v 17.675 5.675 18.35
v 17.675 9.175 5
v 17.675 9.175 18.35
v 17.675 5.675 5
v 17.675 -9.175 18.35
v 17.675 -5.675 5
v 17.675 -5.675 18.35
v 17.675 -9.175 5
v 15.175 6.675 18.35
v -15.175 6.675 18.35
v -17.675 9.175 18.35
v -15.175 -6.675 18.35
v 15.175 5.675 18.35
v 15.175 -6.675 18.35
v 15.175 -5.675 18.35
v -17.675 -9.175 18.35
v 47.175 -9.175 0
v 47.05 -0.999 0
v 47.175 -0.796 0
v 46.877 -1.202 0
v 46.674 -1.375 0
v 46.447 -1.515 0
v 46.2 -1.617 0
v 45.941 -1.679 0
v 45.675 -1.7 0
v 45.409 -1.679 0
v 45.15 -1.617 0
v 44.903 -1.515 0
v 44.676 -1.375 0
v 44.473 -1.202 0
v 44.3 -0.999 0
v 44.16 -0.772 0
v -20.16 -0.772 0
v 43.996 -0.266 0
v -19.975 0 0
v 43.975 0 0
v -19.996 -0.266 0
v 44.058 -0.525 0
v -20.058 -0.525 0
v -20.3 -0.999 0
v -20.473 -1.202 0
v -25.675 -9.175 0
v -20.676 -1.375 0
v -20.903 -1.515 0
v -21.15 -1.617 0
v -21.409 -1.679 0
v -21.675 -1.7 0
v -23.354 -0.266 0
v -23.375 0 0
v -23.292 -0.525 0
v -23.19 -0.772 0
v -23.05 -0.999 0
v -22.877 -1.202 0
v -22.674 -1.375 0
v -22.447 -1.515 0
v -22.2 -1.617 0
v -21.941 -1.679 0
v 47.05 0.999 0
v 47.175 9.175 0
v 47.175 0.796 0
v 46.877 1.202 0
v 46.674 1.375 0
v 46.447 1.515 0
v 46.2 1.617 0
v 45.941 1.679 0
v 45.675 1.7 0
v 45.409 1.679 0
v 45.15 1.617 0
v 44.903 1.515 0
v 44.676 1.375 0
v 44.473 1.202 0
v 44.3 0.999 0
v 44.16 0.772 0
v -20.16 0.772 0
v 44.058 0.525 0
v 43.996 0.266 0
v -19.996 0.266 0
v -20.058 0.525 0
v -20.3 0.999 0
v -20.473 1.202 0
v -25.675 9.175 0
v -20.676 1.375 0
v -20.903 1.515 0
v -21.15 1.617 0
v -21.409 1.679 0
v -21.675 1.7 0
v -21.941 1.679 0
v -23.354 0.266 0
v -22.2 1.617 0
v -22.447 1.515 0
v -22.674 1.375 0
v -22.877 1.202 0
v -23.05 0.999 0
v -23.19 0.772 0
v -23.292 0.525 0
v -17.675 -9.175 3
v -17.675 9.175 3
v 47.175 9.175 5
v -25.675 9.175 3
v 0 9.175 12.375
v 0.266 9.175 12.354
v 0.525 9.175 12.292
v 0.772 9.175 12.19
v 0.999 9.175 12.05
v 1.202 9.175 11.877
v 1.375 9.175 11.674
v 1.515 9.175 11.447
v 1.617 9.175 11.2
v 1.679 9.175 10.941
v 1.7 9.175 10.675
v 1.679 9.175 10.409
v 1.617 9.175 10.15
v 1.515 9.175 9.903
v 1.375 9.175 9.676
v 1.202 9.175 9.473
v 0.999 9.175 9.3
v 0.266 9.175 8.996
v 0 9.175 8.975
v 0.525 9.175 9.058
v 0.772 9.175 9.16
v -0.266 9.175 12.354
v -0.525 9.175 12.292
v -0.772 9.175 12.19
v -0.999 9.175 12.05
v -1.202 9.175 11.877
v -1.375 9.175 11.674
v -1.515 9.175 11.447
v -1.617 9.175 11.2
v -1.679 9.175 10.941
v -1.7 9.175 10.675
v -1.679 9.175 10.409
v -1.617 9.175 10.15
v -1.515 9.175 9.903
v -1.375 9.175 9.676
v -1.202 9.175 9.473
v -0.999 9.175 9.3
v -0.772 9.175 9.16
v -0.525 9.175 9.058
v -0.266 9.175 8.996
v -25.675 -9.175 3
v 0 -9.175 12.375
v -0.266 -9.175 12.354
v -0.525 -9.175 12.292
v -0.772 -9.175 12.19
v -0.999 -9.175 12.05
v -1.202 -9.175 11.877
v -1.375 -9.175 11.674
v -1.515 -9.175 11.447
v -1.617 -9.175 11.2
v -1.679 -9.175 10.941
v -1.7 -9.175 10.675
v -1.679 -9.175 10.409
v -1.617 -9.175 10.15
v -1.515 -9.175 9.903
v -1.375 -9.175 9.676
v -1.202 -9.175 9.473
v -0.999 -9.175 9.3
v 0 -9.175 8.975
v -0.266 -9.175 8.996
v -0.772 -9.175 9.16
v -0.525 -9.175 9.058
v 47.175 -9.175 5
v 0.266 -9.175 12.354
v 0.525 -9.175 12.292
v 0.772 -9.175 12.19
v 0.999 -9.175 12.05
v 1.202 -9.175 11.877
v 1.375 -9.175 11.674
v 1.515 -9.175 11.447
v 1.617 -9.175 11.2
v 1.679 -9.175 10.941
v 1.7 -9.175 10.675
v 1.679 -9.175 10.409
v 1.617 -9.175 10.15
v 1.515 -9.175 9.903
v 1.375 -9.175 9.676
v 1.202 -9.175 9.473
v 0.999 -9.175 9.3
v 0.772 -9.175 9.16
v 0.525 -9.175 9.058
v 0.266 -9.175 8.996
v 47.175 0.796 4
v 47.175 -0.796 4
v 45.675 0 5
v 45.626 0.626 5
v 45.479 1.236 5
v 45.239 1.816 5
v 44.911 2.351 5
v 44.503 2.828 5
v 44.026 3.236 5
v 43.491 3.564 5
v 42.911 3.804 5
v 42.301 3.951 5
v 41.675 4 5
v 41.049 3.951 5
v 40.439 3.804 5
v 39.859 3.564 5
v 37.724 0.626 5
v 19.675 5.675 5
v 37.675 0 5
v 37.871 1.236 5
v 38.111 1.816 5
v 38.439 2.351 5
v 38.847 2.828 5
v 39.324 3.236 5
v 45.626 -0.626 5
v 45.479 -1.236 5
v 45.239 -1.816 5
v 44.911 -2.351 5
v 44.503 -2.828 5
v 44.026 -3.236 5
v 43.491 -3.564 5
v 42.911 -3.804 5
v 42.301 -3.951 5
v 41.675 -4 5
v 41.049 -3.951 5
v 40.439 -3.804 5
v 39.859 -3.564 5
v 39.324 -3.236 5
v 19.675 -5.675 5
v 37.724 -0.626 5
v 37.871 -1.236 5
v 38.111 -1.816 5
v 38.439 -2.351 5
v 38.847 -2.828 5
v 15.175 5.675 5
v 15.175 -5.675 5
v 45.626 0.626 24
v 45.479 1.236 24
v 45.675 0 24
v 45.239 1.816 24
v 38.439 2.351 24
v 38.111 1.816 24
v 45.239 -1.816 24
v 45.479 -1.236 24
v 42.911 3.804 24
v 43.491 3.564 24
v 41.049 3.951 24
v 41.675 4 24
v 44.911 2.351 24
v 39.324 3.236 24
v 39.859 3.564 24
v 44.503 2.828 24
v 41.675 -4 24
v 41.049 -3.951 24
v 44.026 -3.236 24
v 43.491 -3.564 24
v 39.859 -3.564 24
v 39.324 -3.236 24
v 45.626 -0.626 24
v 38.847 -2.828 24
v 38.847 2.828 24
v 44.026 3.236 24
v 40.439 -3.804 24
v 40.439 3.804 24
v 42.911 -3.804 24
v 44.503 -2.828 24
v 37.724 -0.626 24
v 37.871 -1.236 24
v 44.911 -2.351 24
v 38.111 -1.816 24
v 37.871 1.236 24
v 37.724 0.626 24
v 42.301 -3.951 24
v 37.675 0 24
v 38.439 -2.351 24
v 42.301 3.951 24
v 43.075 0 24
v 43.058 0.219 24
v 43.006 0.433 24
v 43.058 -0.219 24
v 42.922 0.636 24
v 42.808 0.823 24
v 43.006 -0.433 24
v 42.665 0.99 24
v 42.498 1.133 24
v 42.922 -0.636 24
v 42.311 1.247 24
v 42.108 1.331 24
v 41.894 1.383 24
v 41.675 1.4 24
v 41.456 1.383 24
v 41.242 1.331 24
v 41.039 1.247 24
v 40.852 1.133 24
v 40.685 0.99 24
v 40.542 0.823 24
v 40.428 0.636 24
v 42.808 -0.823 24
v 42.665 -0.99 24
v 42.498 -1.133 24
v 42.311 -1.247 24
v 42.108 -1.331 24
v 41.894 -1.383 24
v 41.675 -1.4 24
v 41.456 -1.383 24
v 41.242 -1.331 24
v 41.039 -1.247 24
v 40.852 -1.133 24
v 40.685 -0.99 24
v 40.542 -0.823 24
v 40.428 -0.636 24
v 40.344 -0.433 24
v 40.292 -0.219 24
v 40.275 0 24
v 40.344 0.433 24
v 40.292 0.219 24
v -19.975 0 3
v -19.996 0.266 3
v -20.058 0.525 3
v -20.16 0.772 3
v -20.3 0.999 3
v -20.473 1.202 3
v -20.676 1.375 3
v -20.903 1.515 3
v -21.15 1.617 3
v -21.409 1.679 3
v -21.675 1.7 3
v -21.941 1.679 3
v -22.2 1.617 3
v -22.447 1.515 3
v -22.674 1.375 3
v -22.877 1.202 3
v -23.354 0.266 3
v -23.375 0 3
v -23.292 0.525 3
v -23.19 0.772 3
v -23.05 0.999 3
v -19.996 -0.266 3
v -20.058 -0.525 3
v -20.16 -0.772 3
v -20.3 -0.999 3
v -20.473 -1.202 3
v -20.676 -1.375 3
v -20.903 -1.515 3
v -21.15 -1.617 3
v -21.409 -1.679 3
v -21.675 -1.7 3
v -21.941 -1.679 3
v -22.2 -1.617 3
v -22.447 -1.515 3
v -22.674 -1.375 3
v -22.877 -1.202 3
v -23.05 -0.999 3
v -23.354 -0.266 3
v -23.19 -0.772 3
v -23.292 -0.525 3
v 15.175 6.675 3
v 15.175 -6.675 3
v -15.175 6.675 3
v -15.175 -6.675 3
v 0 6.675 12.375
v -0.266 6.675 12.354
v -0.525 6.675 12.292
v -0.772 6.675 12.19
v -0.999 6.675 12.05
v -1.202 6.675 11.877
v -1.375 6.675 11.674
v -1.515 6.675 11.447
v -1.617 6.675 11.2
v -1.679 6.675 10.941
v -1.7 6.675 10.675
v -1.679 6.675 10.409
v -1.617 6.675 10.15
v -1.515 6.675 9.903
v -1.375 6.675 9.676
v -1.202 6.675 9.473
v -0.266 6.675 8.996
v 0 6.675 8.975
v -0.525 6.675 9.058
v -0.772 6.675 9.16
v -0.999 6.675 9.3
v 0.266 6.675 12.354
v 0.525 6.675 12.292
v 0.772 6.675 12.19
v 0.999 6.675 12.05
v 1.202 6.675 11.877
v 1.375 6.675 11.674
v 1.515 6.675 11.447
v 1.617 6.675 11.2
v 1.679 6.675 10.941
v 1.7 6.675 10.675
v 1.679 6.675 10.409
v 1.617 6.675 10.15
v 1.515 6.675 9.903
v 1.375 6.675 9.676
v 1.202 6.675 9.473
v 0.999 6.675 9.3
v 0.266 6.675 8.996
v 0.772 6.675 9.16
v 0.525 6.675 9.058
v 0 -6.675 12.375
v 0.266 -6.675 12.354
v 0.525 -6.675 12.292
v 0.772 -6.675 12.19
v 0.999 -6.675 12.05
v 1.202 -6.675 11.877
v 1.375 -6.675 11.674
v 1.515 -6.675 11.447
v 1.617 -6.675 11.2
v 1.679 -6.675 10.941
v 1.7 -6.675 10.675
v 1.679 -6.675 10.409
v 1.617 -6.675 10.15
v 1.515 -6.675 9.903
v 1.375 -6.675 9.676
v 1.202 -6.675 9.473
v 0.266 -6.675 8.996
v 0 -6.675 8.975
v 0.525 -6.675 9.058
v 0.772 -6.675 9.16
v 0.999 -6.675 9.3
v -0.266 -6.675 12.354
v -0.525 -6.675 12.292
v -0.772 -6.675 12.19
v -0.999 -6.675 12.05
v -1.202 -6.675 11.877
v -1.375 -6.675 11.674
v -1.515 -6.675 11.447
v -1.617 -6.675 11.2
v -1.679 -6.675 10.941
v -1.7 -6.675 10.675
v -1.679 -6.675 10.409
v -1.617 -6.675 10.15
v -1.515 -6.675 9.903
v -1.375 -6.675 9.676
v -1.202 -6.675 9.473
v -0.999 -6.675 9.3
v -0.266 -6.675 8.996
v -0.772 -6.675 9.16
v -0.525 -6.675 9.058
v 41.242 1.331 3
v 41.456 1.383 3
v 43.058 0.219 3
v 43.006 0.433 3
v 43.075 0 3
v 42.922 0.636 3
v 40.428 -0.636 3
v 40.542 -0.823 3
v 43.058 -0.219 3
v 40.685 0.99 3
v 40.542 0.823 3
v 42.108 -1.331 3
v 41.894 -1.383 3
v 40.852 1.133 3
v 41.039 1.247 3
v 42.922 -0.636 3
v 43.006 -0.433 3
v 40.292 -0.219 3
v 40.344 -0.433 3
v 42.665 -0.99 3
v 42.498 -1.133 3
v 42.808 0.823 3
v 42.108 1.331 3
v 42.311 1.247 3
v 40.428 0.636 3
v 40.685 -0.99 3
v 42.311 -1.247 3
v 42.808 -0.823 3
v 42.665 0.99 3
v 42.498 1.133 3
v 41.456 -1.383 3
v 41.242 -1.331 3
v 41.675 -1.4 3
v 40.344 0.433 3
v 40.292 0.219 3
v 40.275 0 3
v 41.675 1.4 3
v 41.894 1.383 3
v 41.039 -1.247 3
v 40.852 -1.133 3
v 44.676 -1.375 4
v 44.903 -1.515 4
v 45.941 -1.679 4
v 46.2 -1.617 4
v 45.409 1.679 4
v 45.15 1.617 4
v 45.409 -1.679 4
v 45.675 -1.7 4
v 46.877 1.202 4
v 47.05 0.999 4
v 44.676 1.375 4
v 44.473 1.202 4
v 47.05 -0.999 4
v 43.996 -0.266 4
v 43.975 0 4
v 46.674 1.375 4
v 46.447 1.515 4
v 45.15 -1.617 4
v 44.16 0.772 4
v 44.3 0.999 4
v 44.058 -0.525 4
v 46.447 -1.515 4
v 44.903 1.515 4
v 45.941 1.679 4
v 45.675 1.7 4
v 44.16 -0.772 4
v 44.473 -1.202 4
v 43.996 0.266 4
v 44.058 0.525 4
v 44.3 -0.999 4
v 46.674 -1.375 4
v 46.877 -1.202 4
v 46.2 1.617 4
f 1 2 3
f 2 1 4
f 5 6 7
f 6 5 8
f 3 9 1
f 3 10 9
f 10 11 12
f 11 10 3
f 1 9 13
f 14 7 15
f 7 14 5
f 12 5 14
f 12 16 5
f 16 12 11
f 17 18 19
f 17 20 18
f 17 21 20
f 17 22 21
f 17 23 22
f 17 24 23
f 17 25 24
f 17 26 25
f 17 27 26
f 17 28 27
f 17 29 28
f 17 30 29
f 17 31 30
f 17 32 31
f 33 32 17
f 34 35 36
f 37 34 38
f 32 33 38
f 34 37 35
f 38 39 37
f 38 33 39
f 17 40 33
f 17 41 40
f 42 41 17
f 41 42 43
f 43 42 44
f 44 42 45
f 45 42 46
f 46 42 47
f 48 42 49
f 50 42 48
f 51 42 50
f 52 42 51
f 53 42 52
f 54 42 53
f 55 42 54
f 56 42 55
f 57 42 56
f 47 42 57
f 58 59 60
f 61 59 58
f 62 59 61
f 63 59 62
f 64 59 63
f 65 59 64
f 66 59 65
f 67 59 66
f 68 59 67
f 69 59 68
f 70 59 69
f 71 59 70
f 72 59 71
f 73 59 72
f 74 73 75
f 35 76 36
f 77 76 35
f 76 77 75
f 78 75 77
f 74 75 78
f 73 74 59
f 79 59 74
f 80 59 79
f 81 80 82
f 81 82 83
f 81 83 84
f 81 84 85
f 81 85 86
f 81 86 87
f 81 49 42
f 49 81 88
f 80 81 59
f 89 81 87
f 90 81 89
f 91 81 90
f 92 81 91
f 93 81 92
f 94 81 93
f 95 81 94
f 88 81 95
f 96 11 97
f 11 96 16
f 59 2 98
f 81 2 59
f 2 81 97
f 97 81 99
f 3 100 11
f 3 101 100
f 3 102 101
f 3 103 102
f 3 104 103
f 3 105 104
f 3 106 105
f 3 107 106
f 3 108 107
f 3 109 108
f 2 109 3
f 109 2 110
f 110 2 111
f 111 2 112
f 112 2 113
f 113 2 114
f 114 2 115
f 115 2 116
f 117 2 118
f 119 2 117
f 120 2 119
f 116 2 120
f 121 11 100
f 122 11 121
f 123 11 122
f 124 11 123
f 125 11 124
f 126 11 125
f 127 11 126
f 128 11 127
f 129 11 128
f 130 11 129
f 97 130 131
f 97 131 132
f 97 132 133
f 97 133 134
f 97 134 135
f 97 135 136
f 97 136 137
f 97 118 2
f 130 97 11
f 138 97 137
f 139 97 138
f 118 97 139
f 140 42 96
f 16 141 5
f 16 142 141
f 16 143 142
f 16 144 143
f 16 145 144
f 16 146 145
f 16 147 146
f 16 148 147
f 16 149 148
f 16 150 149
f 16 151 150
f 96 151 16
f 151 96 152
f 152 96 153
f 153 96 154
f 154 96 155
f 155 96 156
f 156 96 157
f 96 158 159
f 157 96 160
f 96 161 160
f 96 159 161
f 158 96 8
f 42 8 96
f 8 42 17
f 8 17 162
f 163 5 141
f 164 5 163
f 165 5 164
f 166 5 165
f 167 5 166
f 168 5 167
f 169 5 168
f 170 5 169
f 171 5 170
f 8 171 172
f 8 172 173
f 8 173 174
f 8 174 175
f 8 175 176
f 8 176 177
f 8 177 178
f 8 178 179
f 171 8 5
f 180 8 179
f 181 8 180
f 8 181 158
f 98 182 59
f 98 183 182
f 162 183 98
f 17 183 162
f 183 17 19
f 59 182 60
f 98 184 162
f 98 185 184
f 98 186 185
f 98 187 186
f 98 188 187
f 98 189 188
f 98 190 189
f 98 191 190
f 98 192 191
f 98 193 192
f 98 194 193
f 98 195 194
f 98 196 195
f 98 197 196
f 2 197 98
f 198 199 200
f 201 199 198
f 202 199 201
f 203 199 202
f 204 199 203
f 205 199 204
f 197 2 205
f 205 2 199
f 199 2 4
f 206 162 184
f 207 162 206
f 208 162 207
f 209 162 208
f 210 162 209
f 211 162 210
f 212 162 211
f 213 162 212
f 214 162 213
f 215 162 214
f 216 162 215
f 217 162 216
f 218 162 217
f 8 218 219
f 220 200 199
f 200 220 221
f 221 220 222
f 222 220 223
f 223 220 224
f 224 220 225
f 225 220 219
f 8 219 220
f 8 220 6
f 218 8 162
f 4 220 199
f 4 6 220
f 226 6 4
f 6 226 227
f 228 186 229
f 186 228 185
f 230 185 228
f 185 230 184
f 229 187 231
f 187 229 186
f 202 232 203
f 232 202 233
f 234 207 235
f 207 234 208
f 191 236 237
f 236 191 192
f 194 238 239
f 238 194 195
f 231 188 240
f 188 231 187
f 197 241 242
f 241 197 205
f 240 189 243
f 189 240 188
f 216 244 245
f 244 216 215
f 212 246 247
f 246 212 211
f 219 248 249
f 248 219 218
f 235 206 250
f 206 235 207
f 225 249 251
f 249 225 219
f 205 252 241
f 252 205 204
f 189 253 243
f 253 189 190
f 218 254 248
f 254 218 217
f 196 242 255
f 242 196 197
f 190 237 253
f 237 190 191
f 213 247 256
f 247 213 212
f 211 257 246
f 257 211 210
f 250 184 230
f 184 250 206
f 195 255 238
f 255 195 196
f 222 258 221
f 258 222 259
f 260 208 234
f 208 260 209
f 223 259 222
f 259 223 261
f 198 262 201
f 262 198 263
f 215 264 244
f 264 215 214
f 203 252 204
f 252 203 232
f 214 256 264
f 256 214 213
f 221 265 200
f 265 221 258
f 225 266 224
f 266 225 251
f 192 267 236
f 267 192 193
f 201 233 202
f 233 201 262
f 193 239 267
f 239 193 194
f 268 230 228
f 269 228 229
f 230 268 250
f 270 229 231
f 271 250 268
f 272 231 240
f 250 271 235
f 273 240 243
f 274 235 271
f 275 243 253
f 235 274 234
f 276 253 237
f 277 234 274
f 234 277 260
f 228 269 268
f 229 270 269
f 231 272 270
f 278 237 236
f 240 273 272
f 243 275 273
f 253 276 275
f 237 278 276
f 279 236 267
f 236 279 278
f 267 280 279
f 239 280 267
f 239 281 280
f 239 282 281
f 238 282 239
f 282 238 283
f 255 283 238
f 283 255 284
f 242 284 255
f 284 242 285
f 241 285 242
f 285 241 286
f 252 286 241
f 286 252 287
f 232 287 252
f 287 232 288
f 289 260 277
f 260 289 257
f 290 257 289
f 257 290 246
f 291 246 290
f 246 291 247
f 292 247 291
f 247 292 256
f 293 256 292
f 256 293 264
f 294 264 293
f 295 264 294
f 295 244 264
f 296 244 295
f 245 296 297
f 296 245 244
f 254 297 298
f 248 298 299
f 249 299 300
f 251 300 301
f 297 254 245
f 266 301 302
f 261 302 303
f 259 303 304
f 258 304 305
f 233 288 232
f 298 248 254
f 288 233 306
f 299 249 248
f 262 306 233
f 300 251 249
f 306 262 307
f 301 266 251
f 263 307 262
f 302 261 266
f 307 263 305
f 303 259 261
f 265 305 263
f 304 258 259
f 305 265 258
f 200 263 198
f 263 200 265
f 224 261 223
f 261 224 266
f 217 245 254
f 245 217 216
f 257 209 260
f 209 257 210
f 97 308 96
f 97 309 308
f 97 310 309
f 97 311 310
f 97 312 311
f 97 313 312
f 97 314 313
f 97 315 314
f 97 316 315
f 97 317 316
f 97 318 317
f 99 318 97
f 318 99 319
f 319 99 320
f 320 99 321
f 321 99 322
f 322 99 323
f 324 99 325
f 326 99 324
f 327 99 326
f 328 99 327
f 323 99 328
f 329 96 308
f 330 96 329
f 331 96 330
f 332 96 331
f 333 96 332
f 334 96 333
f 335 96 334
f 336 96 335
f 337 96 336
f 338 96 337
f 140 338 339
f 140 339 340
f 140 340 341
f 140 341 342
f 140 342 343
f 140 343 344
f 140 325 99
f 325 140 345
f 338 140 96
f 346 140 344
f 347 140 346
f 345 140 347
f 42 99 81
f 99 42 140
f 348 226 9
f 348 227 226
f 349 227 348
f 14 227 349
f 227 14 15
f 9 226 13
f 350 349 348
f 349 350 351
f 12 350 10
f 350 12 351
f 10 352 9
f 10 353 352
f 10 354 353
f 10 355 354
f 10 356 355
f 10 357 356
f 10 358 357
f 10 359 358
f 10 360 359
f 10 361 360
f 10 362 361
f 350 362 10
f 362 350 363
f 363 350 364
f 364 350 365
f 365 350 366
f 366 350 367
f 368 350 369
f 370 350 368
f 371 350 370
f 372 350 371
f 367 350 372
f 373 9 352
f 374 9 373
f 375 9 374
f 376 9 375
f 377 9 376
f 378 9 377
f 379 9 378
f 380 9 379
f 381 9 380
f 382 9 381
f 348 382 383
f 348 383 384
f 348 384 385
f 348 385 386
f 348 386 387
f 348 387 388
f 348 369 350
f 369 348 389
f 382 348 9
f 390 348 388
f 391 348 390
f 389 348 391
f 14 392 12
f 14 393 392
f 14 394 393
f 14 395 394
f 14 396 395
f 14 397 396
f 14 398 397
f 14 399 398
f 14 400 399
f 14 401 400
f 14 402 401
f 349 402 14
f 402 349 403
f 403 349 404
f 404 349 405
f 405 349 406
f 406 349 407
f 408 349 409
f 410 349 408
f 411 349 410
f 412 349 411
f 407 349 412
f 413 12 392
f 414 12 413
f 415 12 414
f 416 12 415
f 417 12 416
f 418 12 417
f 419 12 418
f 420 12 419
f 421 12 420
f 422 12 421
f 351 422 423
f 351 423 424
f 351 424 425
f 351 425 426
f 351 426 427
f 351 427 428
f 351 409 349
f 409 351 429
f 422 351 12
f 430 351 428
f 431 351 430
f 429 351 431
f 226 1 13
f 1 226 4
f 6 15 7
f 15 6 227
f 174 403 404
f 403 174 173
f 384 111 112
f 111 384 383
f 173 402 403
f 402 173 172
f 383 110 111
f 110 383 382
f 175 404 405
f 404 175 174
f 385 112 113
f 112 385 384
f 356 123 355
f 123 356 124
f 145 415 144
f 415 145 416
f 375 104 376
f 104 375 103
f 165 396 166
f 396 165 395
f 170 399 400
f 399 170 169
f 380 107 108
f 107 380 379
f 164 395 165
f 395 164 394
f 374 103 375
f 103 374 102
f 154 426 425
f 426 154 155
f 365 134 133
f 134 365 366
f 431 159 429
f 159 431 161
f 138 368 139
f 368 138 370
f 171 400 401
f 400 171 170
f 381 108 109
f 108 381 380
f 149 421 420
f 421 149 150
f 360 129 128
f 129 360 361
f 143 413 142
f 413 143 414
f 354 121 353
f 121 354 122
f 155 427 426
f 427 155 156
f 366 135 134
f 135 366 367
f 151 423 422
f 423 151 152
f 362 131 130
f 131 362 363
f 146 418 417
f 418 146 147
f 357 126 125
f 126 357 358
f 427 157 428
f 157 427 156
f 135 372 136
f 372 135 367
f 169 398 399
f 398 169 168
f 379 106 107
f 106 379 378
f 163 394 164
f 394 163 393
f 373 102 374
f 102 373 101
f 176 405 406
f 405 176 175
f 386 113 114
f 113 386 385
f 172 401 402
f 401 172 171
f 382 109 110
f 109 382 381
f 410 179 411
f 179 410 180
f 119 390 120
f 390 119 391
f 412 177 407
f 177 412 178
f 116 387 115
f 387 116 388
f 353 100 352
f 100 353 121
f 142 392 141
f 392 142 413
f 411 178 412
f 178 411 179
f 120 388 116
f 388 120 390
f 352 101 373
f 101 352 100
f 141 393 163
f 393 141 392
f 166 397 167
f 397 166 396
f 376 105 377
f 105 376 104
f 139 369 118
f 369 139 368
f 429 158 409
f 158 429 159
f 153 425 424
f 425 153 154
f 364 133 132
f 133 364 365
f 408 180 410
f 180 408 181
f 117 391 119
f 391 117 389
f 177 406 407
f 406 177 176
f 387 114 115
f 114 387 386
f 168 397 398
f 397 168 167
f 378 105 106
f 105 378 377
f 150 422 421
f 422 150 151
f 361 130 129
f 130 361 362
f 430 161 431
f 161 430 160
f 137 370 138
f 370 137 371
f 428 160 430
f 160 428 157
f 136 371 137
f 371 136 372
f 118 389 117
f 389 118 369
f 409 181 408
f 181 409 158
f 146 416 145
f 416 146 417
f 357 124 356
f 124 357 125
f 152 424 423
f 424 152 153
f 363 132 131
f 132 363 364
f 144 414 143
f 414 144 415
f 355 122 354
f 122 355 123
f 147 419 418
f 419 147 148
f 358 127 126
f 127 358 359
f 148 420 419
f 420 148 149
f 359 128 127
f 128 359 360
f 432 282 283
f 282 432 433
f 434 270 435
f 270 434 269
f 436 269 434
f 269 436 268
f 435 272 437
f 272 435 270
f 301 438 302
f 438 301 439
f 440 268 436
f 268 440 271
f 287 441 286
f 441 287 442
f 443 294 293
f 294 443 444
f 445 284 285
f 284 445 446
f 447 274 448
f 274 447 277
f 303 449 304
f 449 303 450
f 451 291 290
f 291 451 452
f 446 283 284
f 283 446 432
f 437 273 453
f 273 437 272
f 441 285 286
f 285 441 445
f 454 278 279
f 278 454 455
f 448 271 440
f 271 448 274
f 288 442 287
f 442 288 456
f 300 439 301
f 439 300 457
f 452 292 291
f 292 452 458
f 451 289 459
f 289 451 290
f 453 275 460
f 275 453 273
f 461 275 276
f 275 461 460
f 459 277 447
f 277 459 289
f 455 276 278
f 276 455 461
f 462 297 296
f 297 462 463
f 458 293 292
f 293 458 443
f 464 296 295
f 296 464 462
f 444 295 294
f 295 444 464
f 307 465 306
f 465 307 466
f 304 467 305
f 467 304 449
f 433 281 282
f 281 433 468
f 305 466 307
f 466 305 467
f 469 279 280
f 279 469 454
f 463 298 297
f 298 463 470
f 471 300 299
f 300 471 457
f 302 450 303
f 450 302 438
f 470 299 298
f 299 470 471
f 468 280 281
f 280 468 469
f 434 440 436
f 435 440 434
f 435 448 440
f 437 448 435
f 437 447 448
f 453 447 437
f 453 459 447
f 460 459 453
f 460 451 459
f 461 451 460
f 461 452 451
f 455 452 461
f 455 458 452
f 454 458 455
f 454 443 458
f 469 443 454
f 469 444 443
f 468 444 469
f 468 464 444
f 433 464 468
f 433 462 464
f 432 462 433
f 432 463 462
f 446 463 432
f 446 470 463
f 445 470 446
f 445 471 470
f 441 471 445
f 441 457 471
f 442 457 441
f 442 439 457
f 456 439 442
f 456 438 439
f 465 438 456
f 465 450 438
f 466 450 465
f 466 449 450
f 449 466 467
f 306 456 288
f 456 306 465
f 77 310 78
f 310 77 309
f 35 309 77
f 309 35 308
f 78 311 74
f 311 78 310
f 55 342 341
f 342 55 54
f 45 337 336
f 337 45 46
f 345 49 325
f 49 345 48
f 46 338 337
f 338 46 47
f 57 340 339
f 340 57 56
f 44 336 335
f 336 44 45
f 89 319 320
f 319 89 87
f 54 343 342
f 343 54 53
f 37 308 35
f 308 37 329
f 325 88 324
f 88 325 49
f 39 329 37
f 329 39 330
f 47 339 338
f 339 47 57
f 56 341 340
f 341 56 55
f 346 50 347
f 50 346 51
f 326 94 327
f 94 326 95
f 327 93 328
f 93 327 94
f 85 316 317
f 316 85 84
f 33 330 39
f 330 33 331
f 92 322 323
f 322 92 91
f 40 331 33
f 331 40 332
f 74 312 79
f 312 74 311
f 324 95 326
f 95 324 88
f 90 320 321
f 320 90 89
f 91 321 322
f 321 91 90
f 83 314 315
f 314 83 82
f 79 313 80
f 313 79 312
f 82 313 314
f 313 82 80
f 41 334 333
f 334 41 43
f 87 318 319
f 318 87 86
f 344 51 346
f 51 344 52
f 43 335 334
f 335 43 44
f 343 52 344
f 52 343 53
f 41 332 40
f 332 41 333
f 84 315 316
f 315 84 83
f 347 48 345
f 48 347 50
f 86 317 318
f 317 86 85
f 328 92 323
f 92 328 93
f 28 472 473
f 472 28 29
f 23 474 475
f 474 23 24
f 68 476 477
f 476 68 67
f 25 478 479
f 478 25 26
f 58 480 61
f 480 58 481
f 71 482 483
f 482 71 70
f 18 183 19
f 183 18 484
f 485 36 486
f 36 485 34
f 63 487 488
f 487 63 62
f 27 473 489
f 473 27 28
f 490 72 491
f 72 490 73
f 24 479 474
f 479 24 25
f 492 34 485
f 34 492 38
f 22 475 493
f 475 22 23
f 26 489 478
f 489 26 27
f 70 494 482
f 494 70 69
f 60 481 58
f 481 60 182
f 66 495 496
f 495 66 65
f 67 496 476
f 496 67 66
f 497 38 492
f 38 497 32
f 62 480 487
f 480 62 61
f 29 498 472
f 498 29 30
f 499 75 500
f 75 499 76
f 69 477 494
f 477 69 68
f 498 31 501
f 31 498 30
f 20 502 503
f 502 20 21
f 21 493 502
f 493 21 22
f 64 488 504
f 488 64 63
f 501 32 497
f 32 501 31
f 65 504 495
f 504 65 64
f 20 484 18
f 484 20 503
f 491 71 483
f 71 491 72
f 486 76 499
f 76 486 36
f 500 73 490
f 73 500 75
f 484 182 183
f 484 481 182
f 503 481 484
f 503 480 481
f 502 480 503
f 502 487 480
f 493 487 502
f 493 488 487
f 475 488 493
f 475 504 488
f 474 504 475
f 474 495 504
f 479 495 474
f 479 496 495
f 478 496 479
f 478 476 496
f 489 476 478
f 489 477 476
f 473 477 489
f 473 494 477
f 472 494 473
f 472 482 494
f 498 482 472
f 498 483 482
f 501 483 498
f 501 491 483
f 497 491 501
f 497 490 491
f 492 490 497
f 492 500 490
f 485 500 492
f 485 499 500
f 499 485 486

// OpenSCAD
// file: params.scad
// params.scad — Parametros globales para el montaje de actuadores MASK-7
// Compatible con OpenSCAD 2021+

$fn = 40; // Calidad de curvas circulares

// --- Tolerancia general para impresion FDM ---
tol = 0.35; // Holgura lateral para ajuste deslizante firme

// --- Micro-servo standard tipo MG90S / SG90 ---
servo_length = 22.8 + tol;       // Largo del cuerpo principal (mm)
servo_width  = 12.2 + tol;       // Ancho del cuerpo principal (mm)
servo_height = 22.5;             // Altura del cuerpo hasta las orejas de montaje (mm)
servo_total_height = 28.5;       // Altura total incluyendo cabezal del eje (mm)

servo_flange_length = 32.5;      // Largo total con orejas de fijacion (mm)
servo_flange_thickness = 2.5;    // Espesor de las orejas del servo (mm)
servo_hole_dist = 28.0;          // Distancia entre centros de tornillos de fijacion (mm)

// --- Tornilleria ---
screw_m2_dia = 2.0;              // Diametro nominal tornillo M2 (mm)
screw_m2_hole = 2.4;             // Agujero de paso M2 con holgura (mm)
screw_m2_tap  = 1.8;             // Agujero para autorroscar M2 en plastico (mm)

screw_m3_dia = 3.0;              // Diametro nominal tornillo M3 (mm)
screw_m3_hole = 3.4;             // Agujero de paso M3 con holgura (mm)
screw_m3_tap  = 2.8;             // Agujero autorroscante M3 (mm)

// --- Espesores estructurales de soportes ---
wall_thickness = 2.5;            // Espesor de pared minima para rigidez (mm)
base_thickness = 3.0;            // Espesor de la placa base atornillable (mm)

// --- Solenoide mini 5V (tipo JF-0530B) ---
solenoid_length = 30.0 + tol;    // Largo del cuerpo del solenoide (mm)
solenoid_width  = 13.0 + tol;    // Ancho del cuerpo del solenoide (mm)
solenoid_height = 15.0 + tol;    // Altura del cuerpo del solenoide (mm)
solenoid_hole_dist = 16.0;       // Distancia entre agujeros roscados M3 de fijacion (mm)

// --- Campana resonadora ---
bell_diameter = 40.0;            // Diametro de campana o cuenco (mm)
bell_height   = 20.0;            // Altura de campana (mm)
// main file
// bell_mount.scad — Soporte para solenoide percutor y campana de la mascara Hannya
//
// =============================================================================
// MEDIDAS A VERIFICAR EN LA MASCARA REAL ANTES DE IMPRIMIR:
// 1. Diametro y labio de la campana / cuenco metalico resonador utilizado.
// 2. Carrera util del solenoide (4 a 6 mm) y distancia de separacion al cuenco
//    (debe quedar 1 a 2 mm de espacio en reposo para permitir resonancia libre).
// 3. Espacio volumetrico en el interior de la frente o base de los cuernos de la mascara.
// 4. Espesor de pared para evitar transmitir vibracion sorda a la estructura.
// =============================================================================

include <params.scad>

module bell_mount() {
    cradle_l = solenoid_length + (wall_thickness * 2);
    cradle_w = solenoid_width + (wall_thickness * 2);
    cradle_h = solenoid_height + base_thickness;

    arm_length = 32.0;
    post_dia = 8.0;

    difference() {
        union() {
            // Cuna base para el solenoide
            translate([-cradle_l / 2, -cradle_w / 2, 0])
                cube([cradle_l, cradle_w, cradle_h]);

            // Brazo soporte saliente para montar el cuenco / campana
            translate([cradle_l / 2 - wall_thickness, -cradle_w / 2, 0])
                cube([arm_length, cradle_w, base_thickness + 2.0]);

            // Poste cilindrico para fijar el centro de la campana
            translate([cradle_l / 2 + arm_length - 8.0, 0, 0])
                cylinder(d = post_dia, h = bell_height + 4.0);

            // Orejas de fijacion a la mascara
            translate([-cradle_l / 2 - 8.0, -cradle_w / 2, 0])
                cube([8.0, cradle_w, base_thickness]);
        }

        // Alojamiento del cuerpo del solenoide
        translate([-solenoid_length / 2, -solenoid_width / 2, base_thickness])
            cube([solenoid_length, solenoid_width, solenoid_height + 5]);

        // Abertura frontal para el recorrido del percutor
        translate([solenoid_length / 2 - 2, -solenoid_width / 2 + 1, base_thickness + 2])
            cube([wall_thickness + 4, solenoid_width - 2, solenoid_height]);

        // Agujeros laterales para fijar el solenoide con tornillos M3
        translate([0, -cradle_w / 2 - 1, base_thickness + (solenoid_height / 2)])
            rotate([-90, 0, 0])
            cylinder(d = screw_m3_hole, h = cradle_w + 2);

        // Agujero roscado en poste de campana (tornillo axial M3)
        translate([cradle_l / 2 + arm_length - 8.0, 0, base_thickness])
            cylinder(d = screw_m3_tap, h = bell_height + 10);

        // Agujeros de anclaje a la mascara (M3)
        translate([-cradle_l / 2 - 4.0, 0, -1])
            cylinder(d = screw_m3_hole, h = base_thickness + 2);
        translate([cradle_l / 2 + arm_length - 4.0, 0, -1])
            cylinder(d = screw_m3_hole, h = base_thickness + 2);
    }
}

// Renderizado directo
bell_mount();
